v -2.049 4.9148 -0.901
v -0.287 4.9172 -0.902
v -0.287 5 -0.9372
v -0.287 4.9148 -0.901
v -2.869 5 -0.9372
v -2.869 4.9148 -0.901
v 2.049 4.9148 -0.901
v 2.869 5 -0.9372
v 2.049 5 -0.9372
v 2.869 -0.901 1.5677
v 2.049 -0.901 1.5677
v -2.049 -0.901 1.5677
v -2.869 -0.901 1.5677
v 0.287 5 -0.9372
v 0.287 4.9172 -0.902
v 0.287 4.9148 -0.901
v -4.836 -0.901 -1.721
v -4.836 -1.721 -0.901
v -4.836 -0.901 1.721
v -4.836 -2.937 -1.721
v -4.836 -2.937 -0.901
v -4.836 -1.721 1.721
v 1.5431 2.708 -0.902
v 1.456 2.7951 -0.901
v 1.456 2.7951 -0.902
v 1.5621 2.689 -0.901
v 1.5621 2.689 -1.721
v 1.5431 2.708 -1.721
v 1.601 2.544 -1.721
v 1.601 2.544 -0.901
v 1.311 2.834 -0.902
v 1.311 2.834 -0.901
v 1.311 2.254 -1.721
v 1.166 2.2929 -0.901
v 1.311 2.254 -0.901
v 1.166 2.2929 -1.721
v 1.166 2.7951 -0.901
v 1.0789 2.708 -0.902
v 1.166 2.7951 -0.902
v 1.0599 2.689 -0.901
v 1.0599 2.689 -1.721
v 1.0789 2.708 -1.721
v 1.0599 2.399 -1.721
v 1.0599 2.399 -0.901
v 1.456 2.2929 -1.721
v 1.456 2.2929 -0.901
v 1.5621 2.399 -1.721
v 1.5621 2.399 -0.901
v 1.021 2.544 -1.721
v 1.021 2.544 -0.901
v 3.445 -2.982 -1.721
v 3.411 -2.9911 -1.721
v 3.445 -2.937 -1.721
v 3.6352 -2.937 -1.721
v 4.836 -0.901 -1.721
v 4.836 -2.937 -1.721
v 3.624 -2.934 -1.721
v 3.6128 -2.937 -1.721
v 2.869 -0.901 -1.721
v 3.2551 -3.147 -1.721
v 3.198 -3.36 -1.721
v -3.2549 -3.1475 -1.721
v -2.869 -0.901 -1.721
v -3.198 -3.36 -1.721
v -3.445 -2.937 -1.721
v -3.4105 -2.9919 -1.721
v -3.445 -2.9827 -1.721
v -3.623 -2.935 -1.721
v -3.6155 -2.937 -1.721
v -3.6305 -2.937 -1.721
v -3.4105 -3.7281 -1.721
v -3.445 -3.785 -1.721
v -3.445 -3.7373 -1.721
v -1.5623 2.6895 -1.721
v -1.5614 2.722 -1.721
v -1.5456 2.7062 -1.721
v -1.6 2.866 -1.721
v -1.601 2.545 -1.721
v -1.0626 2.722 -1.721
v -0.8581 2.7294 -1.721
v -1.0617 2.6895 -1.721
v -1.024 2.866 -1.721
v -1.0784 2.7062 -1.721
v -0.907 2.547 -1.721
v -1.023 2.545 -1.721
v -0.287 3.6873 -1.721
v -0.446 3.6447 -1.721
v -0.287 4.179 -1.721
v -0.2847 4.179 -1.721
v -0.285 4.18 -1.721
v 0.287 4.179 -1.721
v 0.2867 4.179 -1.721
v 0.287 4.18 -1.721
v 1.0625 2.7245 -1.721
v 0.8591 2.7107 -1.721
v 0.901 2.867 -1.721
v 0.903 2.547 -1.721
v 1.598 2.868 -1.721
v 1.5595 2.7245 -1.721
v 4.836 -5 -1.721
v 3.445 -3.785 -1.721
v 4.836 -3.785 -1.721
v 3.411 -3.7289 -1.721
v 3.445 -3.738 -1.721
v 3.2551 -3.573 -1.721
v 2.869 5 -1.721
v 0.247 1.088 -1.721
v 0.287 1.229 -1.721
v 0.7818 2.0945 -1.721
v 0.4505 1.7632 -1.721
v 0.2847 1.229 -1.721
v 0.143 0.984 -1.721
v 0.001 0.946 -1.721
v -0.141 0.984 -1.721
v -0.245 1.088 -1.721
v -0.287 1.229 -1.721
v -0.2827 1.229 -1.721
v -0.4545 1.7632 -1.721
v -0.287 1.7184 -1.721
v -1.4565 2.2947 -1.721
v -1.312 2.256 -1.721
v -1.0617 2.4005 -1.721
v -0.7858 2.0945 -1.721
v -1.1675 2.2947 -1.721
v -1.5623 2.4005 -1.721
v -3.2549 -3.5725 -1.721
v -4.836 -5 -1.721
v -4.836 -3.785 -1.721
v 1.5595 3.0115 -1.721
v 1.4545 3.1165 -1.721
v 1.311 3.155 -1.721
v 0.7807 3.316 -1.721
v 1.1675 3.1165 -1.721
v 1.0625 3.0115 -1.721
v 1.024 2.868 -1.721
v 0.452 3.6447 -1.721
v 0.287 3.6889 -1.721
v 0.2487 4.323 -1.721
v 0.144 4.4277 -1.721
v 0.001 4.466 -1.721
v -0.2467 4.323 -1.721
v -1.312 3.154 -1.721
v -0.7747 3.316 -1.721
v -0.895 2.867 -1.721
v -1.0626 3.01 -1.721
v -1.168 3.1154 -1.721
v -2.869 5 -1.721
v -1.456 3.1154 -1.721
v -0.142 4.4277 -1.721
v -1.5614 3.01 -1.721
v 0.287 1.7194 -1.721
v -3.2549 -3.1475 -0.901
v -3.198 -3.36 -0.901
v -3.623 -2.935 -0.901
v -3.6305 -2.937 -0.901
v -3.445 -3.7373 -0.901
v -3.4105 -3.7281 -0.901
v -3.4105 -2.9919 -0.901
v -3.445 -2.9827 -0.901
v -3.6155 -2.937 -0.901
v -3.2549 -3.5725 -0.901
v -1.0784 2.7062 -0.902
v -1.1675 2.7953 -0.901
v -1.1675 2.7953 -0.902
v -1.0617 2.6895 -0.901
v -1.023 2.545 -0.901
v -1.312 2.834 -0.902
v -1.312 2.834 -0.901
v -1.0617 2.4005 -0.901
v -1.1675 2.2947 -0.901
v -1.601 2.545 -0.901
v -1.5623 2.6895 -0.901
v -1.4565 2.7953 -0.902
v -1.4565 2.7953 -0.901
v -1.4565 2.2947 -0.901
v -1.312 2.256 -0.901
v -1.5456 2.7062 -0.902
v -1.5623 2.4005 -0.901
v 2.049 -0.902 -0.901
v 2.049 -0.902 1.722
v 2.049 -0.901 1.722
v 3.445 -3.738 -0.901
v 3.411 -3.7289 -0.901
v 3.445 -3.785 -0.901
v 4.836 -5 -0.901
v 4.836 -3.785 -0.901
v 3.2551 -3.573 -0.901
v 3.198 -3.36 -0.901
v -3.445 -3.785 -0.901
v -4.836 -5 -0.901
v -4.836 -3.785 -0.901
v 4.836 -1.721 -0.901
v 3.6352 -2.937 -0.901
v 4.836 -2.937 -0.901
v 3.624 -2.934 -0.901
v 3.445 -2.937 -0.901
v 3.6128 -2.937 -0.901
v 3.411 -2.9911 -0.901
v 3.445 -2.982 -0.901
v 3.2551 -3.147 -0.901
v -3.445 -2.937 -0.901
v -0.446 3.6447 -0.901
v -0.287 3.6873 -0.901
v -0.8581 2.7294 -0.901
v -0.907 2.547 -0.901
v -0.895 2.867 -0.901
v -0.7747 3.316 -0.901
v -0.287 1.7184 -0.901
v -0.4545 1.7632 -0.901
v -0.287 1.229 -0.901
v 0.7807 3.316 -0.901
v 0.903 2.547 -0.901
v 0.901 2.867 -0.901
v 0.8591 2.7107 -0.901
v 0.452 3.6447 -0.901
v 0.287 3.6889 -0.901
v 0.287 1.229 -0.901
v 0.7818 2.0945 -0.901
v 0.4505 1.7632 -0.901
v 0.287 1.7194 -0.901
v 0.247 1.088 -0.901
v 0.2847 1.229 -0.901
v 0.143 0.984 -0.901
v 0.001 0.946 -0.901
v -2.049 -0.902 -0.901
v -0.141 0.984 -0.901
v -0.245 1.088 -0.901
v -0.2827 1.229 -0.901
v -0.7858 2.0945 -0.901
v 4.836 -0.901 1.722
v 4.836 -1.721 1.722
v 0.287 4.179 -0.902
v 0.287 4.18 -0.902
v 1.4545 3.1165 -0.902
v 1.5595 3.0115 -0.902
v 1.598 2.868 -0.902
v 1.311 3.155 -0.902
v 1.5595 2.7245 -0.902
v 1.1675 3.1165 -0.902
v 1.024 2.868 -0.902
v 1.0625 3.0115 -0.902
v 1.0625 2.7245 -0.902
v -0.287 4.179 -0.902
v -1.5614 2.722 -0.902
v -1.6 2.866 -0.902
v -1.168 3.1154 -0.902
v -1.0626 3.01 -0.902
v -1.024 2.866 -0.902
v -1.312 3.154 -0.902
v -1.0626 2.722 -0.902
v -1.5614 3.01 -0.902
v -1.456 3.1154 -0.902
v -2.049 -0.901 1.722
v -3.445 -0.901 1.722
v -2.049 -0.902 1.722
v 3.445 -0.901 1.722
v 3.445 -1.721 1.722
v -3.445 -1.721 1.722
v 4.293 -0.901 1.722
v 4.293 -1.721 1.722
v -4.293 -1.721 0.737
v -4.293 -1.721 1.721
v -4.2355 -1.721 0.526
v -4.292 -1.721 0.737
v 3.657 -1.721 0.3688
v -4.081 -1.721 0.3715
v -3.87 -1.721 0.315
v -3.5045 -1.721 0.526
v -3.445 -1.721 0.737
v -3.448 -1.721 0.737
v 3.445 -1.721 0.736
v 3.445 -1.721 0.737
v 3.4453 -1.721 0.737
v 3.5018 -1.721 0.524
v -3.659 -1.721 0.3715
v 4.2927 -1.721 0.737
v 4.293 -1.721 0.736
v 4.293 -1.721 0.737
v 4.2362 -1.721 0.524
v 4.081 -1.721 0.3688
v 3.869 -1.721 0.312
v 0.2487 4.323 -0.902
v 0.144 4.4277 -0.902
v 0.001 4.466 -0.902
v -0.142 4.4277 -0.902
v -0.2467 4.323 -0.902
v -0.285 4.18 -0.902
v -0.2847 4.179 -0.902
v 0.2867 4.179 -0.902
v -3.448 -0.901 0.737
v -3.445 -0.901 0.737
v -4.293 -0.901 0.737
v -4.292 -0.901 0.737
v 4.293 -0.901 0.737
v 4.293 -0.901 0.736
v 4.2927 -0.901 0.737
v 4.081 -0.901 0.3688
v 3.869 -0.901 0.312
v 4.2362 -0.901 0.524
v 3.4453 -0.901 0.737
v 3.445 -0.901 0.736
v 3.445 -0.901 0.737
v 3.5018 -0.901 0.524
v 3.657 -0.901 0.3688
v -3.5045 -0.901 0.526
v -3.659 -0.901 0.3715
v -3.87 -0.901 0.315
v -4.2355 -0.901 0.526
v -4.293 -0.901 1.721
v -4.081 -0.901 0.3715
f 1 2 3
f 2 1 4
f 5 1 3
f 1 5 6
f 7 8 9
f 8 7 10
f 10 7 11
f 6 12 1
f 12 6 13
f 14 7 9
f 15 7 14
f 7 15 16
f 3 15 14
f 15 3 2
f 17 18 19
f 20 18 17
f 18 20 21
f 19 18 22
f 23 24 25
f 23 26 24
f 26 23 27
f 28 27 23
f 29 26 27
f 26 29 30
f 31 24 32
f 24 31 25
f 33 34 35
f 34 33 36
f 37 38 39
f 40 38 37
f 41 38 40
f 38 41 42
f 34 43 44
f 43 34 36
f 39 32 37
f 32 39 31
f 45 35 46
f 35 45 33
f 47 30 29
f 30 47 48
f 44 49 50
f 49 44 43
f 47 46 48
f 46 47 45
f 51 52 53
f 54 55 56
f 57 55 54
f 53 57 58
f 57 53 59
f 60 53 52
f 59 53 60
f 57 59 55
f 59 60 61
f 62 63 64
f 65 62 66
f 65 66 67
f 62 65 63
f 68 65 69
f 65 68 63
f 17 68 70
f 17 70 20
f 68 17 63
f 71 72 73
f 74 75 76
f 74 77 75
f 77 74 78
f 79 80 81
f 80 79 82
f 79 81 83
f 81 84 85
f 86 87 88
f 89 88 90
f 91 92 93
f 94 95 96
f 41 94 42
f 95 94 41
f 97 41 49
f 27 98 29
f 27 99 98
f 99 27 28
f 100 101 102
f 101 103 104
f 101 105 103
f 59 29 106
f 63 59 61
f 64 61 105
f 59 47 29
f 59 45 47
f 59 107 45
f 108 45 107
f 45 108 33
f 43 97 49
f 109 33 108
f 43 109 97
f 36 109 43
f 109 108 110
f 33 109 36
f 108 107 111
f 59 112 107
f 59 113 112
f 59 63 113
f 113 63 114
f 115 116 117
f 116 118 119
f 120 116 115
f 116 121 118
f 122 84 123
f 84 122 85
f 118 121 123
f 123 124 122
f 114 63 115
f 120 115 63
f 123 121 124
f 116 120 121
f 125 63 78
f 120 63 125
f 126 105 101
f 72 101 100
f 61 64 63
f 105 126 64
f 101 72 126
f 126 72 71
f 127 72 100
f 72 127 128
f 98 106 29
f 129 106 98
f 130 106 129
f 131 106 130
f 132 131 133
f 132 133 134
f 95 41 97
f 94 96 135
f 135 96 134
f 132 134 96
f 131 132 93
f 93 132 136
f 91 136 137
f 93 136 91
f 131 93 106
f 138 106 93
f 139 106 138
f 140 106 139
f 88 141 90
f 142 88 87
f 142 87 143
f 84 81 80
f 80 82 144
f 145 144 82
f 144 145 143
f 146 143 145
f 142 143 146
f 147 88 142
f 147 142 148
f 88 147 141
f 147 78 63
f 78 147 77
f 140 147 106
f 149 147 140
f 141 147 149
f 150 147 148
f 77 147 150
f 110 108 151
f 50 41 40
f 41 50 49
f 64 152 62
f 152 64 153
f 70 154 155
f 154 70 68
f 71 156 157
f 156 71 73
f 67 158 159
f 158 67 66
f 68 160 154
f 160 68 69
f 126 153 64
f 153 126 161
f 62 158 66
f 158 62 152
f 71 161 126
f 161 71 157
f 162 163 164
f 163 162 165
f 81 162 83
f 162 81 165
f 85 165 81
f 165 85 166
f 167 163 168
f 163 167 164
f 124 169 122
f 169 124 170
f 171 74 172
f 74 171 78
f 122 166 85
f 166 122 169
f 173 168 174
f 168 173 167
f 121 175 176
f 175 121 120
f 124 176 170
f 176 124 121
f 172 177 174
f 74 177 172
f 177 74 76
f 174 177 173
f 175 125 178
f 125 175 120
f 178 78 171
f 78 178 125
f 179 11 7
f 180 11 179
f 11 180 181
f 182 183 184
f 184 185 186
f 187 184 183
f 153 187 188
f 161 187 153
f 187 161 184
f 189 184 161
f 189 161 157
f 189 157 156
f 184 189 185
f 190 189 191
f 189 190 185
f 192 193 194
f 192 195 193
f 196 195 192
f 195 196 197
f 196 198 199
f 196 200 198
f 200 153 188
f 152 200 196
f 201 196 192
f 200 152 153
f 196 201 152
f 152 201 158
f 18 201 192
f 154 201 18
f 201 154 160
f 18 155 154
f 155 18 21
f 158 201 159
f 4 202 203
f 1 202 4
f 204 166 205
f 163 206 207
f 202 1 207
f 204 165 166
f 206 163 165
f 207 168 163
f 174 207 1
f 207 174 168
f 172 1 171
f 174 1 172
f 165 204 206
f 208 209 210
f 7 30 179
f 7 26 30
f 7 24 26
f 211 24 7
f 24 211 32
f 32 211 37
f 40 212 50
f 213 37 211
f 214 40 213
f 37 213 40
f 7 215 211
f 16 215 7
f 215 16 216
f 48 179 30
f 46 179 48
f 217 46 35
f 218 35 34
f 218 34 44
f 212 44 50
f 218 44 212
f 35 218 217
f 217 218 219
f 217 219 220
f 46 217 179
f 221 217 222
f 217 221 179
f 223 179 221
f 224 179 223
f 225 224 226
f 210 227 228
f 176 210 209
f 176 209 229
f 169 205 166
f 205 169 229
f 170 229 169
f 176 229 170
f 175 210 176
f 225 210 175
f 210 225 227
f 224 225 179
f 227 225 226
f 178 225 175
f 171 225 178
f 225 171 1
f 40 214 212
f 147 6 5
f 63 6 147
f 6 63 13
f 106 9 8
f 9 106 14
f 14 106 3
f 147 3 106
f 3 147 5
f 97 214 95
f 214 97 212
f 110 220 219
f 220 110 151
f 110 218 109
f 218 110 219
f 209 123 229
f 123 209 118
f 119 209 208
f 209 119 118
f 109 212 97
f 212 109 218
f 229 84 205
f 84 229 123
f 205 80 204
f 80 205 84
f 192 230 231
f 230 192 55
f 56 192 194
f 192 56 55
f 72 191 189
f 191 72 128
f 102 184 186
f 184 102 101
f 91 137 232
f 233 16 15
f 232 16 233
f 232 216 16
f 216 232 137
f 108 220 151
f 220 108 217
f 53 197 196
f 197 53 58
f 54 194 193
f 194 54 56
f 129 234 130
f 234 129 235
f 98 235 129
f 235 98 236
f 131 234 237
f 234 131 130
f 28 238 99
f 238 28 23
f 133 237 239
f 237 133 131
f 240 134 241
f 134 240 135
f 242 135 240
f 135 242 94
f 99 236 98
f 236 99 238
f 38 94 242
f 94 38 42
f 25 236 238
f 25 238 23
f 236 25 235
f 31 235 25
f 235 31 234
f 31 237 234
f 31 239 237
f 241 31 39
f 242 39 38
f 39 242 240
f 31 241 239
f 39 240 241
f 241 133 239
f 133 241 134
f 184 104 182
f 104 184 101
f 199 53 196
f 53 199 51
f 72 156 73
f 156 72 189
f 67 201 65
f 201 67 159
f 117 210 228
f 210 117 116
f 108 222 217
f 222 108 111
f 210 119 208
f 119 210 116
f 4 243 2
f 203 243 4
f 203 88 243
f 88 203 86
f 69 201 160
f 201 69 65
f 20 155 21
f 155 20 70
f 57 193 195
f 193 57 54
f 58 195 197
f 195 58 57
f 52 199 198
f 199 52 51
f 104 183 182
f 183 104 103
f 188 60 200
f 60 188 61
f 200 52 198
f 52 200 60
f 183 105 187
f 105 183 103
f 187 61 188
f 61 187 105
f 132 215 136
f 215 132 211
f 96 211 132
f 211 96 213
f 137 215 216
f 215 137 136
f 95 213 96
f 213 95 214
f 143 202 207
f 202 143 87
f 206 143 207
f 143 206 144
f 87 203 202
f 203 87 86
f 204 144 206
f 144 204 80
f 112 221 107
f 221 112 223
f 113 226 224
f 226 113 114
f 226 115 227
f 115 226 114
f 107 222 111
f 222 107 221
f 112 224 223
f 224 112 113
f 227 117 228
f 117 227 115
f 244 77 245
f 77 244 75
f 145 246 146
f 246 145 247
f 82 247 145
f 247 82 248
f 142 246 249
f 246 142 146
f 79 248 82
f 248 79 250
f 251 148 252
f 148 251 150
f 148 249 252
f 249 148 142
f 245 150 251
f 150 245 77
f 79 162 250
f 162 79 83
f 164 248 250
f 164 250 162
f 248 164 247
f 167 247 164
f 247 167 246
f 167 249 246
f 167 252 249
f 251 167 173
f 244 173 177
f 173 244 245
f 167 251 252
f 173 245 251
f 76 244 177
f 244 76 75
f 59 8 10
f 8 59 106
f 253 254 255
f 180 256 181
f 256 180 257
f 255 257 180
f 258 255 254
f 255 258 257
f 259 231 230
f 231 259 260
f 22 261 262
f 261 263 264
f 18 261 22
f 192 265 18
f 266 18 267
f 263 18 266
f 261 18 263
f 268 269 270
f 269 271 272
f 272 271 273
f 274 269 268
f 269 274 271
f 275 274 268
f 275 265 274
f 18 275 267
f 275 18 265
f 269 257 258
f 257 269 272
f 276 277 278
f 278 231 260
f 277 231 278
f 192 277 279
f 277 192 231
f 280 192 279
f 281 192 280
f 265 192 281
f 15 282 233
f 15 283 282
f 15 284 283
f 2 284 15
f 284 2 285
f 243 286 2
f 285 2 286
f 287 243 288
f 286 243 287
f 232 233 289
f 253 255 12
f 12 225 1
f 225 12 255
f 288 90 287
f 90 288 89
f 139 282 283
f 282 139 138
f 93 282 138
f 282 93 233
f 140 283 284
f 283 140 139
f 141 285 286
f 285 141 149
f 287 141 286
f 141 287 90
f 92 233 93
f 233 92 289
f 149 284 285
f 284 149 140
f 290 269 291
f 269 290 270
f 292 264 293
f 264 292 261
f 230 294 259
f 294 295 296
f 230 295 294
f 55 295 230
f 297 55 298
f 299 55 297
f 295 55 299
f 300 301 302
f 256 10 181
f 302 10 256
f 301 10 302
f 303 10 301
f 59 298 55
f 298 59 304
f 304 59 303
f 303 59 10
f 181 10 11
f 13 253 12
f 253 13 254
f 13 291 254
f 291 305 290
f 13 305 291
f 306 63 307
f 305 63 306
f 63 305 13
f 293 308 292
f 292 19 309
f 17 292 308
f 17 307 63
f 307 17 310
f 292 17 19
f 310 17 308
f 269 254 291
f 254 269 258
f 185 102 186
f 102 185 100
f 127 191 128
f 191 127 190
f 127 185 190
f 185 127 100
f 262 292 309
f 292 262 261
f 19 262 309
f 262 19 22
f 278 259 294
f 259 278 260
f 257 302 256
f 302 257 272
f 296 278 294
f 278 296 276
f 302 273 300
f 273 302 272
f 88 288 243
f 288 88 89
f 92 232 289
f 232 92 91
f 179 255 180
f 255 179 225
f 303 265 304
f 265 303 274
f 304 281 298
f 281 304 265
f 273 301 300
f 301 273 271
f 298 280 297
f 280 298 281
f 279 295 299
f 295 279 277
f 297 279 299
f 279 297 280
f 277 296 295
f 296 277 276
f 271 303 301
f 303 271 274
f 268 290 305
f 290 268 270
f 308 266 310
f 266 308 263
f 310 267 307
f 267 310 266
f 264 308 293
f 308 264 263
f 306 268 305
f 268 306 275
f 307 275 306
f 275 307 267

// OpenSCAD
intersection() {
translate([-5.803, -6, -2.066]) cube(size = [11.607, 12, 4.131], center = false);
union() {
intersection() {
difference() {
difference() {
rotate([-23, 0, 0])
translate([-4.836, -18.1, -18.1]) cube(size = [22.936, 36.2, 19.191], center = false);
translate([1.311, 2.544, -1.721])
cylinder(h = 2.458, r1 = 0.29, r2 = 0.29, center = false, $fn = 12);
}
union() {
translate([-3.623, -3.36, -1.721])
cylinder(h = 2.458, r1 = 0.425, r2 = 0.425, center = false, $fn = 12);
translate([-1.312, 2.545, -1.721])
cylinder(h = 19.821, r1 = 0.289, r2 = 0.289, center = false, $fn = 12);
}
}
union() {
difference() {
translate([-2.869, -0.902, -1.721]) cube(size = [4.918, 5.902, 0.82], center = false);
translate([-0.002, 2.547, -18.1])
cylinder(h = 36.2, r1 = 0.905, r2 = 0.905, center = false, $fn = 12);
}
translate([-4.836, -3.785, -1.721]) cube(size = [9.672, 2.883, 0.82], center = false);
}
difference() {
union() {
translate([-3.445, -3.785, -1.721]) cube(size = [6.89, 5.014, 0.82], center = false);
translate([-18.1, -2.937, -1.721]) cube(size = [17.813, 7.937, 3.443], center = false);
difference() {
translate([0.287, -2.937, -1.721]) cube(size = [17.813, 7.937, 0.82], center = false);
translate([1.311, 2.868, -18.1])
cylinder(h = 17.198, r1 = 0.287, r2 = 0.287, center = false, $fn = 12);
}
}
union() {
translate([3.624, -3.36, -1.721])
cylinder(h = 0.82, r1 = 0.426, r2 = 0.426, center = false, $fn = 12);
translate([0.003, 2.867, -18.1])
cylinder(h = 18.837, r1 = 0.898, r2 = 0.898, center = false, $fn = 12);
translate([0.001, 1.23, -18.1])
cylinder(h = 19.821, r1 = 0.284, r2 = 0.284, center = false, $fn = 12);
translate([-1.312, 2.866, -18.1])
cylinder(h = 17.198, r1 = 0.288, r2 = 0.288, center = false, $fn = 12);
}
}
}
difference() {
union() {
difference() {
difference() {
translate([-2.869, -1.721, -1.721]) cube(size = [5.738, 6.721, 3.443], center = false);
translate([-2.049, 1.23, -0.902]) cube(size = [4.098, 3.77, 19.002], center = false);
}
union() {
rotate([-23, 0, 0])
translate([-2.869, -18.1, 1.091]) cube(size = [5.738, 36.2, 17.009], center = false);
translate([0.001, 4.18, -18.1])
cylinder(h = 18.837, r1 = 0.286, r2 = 0.286, center = false, $fn = 12);
}
}
translate([-4.836, -1.721, -1.721]) cube(size = [9.672, 0.82, 2.458], center = false);
translate([-3.445, -1.721, -1.721]) cube(size = [8.281, 0.82, 3.443], center = false);
translate([-4.836, -5, -1.721]) cube(size = [9.672, 1.215, 0.82], center = false);
translate([-4.836, -1.721, -0.902]) cube(size = [0.543, 0.82, 2.623], center = false);
}
union() {
translate([3.445, -1.721, 0.737]) cube(size = [0.848, 0.82, 17.363], center = false);
intersection() {
translate([0, 0, 0]) sphere(r = 54.3, $fn = 12);
rotate([-23, 0, 0])
translate([3.445, -18.1, 1.091]) cube(size = [0.848, 36.2, 17.009], center = false);
}
translate([-2.049, -0.902, -1.721]) cube(size = [4.098, 5.081, 19.821], center = false);
rotate([180, 90, -90])
translate([-0.736, -3.869, -18.1])
cylinder(h = 19.33, r1 = 0.424, r2 = 0.424, center = false, $fn = 12);
rotate([180, 90, -90])
translate([-0.737, 3.87, -1.721])
cylinder(h = 0.82, r1 = 0.422, r2 = 0.422, center = false, $fn = 12);
}
}
}
}
